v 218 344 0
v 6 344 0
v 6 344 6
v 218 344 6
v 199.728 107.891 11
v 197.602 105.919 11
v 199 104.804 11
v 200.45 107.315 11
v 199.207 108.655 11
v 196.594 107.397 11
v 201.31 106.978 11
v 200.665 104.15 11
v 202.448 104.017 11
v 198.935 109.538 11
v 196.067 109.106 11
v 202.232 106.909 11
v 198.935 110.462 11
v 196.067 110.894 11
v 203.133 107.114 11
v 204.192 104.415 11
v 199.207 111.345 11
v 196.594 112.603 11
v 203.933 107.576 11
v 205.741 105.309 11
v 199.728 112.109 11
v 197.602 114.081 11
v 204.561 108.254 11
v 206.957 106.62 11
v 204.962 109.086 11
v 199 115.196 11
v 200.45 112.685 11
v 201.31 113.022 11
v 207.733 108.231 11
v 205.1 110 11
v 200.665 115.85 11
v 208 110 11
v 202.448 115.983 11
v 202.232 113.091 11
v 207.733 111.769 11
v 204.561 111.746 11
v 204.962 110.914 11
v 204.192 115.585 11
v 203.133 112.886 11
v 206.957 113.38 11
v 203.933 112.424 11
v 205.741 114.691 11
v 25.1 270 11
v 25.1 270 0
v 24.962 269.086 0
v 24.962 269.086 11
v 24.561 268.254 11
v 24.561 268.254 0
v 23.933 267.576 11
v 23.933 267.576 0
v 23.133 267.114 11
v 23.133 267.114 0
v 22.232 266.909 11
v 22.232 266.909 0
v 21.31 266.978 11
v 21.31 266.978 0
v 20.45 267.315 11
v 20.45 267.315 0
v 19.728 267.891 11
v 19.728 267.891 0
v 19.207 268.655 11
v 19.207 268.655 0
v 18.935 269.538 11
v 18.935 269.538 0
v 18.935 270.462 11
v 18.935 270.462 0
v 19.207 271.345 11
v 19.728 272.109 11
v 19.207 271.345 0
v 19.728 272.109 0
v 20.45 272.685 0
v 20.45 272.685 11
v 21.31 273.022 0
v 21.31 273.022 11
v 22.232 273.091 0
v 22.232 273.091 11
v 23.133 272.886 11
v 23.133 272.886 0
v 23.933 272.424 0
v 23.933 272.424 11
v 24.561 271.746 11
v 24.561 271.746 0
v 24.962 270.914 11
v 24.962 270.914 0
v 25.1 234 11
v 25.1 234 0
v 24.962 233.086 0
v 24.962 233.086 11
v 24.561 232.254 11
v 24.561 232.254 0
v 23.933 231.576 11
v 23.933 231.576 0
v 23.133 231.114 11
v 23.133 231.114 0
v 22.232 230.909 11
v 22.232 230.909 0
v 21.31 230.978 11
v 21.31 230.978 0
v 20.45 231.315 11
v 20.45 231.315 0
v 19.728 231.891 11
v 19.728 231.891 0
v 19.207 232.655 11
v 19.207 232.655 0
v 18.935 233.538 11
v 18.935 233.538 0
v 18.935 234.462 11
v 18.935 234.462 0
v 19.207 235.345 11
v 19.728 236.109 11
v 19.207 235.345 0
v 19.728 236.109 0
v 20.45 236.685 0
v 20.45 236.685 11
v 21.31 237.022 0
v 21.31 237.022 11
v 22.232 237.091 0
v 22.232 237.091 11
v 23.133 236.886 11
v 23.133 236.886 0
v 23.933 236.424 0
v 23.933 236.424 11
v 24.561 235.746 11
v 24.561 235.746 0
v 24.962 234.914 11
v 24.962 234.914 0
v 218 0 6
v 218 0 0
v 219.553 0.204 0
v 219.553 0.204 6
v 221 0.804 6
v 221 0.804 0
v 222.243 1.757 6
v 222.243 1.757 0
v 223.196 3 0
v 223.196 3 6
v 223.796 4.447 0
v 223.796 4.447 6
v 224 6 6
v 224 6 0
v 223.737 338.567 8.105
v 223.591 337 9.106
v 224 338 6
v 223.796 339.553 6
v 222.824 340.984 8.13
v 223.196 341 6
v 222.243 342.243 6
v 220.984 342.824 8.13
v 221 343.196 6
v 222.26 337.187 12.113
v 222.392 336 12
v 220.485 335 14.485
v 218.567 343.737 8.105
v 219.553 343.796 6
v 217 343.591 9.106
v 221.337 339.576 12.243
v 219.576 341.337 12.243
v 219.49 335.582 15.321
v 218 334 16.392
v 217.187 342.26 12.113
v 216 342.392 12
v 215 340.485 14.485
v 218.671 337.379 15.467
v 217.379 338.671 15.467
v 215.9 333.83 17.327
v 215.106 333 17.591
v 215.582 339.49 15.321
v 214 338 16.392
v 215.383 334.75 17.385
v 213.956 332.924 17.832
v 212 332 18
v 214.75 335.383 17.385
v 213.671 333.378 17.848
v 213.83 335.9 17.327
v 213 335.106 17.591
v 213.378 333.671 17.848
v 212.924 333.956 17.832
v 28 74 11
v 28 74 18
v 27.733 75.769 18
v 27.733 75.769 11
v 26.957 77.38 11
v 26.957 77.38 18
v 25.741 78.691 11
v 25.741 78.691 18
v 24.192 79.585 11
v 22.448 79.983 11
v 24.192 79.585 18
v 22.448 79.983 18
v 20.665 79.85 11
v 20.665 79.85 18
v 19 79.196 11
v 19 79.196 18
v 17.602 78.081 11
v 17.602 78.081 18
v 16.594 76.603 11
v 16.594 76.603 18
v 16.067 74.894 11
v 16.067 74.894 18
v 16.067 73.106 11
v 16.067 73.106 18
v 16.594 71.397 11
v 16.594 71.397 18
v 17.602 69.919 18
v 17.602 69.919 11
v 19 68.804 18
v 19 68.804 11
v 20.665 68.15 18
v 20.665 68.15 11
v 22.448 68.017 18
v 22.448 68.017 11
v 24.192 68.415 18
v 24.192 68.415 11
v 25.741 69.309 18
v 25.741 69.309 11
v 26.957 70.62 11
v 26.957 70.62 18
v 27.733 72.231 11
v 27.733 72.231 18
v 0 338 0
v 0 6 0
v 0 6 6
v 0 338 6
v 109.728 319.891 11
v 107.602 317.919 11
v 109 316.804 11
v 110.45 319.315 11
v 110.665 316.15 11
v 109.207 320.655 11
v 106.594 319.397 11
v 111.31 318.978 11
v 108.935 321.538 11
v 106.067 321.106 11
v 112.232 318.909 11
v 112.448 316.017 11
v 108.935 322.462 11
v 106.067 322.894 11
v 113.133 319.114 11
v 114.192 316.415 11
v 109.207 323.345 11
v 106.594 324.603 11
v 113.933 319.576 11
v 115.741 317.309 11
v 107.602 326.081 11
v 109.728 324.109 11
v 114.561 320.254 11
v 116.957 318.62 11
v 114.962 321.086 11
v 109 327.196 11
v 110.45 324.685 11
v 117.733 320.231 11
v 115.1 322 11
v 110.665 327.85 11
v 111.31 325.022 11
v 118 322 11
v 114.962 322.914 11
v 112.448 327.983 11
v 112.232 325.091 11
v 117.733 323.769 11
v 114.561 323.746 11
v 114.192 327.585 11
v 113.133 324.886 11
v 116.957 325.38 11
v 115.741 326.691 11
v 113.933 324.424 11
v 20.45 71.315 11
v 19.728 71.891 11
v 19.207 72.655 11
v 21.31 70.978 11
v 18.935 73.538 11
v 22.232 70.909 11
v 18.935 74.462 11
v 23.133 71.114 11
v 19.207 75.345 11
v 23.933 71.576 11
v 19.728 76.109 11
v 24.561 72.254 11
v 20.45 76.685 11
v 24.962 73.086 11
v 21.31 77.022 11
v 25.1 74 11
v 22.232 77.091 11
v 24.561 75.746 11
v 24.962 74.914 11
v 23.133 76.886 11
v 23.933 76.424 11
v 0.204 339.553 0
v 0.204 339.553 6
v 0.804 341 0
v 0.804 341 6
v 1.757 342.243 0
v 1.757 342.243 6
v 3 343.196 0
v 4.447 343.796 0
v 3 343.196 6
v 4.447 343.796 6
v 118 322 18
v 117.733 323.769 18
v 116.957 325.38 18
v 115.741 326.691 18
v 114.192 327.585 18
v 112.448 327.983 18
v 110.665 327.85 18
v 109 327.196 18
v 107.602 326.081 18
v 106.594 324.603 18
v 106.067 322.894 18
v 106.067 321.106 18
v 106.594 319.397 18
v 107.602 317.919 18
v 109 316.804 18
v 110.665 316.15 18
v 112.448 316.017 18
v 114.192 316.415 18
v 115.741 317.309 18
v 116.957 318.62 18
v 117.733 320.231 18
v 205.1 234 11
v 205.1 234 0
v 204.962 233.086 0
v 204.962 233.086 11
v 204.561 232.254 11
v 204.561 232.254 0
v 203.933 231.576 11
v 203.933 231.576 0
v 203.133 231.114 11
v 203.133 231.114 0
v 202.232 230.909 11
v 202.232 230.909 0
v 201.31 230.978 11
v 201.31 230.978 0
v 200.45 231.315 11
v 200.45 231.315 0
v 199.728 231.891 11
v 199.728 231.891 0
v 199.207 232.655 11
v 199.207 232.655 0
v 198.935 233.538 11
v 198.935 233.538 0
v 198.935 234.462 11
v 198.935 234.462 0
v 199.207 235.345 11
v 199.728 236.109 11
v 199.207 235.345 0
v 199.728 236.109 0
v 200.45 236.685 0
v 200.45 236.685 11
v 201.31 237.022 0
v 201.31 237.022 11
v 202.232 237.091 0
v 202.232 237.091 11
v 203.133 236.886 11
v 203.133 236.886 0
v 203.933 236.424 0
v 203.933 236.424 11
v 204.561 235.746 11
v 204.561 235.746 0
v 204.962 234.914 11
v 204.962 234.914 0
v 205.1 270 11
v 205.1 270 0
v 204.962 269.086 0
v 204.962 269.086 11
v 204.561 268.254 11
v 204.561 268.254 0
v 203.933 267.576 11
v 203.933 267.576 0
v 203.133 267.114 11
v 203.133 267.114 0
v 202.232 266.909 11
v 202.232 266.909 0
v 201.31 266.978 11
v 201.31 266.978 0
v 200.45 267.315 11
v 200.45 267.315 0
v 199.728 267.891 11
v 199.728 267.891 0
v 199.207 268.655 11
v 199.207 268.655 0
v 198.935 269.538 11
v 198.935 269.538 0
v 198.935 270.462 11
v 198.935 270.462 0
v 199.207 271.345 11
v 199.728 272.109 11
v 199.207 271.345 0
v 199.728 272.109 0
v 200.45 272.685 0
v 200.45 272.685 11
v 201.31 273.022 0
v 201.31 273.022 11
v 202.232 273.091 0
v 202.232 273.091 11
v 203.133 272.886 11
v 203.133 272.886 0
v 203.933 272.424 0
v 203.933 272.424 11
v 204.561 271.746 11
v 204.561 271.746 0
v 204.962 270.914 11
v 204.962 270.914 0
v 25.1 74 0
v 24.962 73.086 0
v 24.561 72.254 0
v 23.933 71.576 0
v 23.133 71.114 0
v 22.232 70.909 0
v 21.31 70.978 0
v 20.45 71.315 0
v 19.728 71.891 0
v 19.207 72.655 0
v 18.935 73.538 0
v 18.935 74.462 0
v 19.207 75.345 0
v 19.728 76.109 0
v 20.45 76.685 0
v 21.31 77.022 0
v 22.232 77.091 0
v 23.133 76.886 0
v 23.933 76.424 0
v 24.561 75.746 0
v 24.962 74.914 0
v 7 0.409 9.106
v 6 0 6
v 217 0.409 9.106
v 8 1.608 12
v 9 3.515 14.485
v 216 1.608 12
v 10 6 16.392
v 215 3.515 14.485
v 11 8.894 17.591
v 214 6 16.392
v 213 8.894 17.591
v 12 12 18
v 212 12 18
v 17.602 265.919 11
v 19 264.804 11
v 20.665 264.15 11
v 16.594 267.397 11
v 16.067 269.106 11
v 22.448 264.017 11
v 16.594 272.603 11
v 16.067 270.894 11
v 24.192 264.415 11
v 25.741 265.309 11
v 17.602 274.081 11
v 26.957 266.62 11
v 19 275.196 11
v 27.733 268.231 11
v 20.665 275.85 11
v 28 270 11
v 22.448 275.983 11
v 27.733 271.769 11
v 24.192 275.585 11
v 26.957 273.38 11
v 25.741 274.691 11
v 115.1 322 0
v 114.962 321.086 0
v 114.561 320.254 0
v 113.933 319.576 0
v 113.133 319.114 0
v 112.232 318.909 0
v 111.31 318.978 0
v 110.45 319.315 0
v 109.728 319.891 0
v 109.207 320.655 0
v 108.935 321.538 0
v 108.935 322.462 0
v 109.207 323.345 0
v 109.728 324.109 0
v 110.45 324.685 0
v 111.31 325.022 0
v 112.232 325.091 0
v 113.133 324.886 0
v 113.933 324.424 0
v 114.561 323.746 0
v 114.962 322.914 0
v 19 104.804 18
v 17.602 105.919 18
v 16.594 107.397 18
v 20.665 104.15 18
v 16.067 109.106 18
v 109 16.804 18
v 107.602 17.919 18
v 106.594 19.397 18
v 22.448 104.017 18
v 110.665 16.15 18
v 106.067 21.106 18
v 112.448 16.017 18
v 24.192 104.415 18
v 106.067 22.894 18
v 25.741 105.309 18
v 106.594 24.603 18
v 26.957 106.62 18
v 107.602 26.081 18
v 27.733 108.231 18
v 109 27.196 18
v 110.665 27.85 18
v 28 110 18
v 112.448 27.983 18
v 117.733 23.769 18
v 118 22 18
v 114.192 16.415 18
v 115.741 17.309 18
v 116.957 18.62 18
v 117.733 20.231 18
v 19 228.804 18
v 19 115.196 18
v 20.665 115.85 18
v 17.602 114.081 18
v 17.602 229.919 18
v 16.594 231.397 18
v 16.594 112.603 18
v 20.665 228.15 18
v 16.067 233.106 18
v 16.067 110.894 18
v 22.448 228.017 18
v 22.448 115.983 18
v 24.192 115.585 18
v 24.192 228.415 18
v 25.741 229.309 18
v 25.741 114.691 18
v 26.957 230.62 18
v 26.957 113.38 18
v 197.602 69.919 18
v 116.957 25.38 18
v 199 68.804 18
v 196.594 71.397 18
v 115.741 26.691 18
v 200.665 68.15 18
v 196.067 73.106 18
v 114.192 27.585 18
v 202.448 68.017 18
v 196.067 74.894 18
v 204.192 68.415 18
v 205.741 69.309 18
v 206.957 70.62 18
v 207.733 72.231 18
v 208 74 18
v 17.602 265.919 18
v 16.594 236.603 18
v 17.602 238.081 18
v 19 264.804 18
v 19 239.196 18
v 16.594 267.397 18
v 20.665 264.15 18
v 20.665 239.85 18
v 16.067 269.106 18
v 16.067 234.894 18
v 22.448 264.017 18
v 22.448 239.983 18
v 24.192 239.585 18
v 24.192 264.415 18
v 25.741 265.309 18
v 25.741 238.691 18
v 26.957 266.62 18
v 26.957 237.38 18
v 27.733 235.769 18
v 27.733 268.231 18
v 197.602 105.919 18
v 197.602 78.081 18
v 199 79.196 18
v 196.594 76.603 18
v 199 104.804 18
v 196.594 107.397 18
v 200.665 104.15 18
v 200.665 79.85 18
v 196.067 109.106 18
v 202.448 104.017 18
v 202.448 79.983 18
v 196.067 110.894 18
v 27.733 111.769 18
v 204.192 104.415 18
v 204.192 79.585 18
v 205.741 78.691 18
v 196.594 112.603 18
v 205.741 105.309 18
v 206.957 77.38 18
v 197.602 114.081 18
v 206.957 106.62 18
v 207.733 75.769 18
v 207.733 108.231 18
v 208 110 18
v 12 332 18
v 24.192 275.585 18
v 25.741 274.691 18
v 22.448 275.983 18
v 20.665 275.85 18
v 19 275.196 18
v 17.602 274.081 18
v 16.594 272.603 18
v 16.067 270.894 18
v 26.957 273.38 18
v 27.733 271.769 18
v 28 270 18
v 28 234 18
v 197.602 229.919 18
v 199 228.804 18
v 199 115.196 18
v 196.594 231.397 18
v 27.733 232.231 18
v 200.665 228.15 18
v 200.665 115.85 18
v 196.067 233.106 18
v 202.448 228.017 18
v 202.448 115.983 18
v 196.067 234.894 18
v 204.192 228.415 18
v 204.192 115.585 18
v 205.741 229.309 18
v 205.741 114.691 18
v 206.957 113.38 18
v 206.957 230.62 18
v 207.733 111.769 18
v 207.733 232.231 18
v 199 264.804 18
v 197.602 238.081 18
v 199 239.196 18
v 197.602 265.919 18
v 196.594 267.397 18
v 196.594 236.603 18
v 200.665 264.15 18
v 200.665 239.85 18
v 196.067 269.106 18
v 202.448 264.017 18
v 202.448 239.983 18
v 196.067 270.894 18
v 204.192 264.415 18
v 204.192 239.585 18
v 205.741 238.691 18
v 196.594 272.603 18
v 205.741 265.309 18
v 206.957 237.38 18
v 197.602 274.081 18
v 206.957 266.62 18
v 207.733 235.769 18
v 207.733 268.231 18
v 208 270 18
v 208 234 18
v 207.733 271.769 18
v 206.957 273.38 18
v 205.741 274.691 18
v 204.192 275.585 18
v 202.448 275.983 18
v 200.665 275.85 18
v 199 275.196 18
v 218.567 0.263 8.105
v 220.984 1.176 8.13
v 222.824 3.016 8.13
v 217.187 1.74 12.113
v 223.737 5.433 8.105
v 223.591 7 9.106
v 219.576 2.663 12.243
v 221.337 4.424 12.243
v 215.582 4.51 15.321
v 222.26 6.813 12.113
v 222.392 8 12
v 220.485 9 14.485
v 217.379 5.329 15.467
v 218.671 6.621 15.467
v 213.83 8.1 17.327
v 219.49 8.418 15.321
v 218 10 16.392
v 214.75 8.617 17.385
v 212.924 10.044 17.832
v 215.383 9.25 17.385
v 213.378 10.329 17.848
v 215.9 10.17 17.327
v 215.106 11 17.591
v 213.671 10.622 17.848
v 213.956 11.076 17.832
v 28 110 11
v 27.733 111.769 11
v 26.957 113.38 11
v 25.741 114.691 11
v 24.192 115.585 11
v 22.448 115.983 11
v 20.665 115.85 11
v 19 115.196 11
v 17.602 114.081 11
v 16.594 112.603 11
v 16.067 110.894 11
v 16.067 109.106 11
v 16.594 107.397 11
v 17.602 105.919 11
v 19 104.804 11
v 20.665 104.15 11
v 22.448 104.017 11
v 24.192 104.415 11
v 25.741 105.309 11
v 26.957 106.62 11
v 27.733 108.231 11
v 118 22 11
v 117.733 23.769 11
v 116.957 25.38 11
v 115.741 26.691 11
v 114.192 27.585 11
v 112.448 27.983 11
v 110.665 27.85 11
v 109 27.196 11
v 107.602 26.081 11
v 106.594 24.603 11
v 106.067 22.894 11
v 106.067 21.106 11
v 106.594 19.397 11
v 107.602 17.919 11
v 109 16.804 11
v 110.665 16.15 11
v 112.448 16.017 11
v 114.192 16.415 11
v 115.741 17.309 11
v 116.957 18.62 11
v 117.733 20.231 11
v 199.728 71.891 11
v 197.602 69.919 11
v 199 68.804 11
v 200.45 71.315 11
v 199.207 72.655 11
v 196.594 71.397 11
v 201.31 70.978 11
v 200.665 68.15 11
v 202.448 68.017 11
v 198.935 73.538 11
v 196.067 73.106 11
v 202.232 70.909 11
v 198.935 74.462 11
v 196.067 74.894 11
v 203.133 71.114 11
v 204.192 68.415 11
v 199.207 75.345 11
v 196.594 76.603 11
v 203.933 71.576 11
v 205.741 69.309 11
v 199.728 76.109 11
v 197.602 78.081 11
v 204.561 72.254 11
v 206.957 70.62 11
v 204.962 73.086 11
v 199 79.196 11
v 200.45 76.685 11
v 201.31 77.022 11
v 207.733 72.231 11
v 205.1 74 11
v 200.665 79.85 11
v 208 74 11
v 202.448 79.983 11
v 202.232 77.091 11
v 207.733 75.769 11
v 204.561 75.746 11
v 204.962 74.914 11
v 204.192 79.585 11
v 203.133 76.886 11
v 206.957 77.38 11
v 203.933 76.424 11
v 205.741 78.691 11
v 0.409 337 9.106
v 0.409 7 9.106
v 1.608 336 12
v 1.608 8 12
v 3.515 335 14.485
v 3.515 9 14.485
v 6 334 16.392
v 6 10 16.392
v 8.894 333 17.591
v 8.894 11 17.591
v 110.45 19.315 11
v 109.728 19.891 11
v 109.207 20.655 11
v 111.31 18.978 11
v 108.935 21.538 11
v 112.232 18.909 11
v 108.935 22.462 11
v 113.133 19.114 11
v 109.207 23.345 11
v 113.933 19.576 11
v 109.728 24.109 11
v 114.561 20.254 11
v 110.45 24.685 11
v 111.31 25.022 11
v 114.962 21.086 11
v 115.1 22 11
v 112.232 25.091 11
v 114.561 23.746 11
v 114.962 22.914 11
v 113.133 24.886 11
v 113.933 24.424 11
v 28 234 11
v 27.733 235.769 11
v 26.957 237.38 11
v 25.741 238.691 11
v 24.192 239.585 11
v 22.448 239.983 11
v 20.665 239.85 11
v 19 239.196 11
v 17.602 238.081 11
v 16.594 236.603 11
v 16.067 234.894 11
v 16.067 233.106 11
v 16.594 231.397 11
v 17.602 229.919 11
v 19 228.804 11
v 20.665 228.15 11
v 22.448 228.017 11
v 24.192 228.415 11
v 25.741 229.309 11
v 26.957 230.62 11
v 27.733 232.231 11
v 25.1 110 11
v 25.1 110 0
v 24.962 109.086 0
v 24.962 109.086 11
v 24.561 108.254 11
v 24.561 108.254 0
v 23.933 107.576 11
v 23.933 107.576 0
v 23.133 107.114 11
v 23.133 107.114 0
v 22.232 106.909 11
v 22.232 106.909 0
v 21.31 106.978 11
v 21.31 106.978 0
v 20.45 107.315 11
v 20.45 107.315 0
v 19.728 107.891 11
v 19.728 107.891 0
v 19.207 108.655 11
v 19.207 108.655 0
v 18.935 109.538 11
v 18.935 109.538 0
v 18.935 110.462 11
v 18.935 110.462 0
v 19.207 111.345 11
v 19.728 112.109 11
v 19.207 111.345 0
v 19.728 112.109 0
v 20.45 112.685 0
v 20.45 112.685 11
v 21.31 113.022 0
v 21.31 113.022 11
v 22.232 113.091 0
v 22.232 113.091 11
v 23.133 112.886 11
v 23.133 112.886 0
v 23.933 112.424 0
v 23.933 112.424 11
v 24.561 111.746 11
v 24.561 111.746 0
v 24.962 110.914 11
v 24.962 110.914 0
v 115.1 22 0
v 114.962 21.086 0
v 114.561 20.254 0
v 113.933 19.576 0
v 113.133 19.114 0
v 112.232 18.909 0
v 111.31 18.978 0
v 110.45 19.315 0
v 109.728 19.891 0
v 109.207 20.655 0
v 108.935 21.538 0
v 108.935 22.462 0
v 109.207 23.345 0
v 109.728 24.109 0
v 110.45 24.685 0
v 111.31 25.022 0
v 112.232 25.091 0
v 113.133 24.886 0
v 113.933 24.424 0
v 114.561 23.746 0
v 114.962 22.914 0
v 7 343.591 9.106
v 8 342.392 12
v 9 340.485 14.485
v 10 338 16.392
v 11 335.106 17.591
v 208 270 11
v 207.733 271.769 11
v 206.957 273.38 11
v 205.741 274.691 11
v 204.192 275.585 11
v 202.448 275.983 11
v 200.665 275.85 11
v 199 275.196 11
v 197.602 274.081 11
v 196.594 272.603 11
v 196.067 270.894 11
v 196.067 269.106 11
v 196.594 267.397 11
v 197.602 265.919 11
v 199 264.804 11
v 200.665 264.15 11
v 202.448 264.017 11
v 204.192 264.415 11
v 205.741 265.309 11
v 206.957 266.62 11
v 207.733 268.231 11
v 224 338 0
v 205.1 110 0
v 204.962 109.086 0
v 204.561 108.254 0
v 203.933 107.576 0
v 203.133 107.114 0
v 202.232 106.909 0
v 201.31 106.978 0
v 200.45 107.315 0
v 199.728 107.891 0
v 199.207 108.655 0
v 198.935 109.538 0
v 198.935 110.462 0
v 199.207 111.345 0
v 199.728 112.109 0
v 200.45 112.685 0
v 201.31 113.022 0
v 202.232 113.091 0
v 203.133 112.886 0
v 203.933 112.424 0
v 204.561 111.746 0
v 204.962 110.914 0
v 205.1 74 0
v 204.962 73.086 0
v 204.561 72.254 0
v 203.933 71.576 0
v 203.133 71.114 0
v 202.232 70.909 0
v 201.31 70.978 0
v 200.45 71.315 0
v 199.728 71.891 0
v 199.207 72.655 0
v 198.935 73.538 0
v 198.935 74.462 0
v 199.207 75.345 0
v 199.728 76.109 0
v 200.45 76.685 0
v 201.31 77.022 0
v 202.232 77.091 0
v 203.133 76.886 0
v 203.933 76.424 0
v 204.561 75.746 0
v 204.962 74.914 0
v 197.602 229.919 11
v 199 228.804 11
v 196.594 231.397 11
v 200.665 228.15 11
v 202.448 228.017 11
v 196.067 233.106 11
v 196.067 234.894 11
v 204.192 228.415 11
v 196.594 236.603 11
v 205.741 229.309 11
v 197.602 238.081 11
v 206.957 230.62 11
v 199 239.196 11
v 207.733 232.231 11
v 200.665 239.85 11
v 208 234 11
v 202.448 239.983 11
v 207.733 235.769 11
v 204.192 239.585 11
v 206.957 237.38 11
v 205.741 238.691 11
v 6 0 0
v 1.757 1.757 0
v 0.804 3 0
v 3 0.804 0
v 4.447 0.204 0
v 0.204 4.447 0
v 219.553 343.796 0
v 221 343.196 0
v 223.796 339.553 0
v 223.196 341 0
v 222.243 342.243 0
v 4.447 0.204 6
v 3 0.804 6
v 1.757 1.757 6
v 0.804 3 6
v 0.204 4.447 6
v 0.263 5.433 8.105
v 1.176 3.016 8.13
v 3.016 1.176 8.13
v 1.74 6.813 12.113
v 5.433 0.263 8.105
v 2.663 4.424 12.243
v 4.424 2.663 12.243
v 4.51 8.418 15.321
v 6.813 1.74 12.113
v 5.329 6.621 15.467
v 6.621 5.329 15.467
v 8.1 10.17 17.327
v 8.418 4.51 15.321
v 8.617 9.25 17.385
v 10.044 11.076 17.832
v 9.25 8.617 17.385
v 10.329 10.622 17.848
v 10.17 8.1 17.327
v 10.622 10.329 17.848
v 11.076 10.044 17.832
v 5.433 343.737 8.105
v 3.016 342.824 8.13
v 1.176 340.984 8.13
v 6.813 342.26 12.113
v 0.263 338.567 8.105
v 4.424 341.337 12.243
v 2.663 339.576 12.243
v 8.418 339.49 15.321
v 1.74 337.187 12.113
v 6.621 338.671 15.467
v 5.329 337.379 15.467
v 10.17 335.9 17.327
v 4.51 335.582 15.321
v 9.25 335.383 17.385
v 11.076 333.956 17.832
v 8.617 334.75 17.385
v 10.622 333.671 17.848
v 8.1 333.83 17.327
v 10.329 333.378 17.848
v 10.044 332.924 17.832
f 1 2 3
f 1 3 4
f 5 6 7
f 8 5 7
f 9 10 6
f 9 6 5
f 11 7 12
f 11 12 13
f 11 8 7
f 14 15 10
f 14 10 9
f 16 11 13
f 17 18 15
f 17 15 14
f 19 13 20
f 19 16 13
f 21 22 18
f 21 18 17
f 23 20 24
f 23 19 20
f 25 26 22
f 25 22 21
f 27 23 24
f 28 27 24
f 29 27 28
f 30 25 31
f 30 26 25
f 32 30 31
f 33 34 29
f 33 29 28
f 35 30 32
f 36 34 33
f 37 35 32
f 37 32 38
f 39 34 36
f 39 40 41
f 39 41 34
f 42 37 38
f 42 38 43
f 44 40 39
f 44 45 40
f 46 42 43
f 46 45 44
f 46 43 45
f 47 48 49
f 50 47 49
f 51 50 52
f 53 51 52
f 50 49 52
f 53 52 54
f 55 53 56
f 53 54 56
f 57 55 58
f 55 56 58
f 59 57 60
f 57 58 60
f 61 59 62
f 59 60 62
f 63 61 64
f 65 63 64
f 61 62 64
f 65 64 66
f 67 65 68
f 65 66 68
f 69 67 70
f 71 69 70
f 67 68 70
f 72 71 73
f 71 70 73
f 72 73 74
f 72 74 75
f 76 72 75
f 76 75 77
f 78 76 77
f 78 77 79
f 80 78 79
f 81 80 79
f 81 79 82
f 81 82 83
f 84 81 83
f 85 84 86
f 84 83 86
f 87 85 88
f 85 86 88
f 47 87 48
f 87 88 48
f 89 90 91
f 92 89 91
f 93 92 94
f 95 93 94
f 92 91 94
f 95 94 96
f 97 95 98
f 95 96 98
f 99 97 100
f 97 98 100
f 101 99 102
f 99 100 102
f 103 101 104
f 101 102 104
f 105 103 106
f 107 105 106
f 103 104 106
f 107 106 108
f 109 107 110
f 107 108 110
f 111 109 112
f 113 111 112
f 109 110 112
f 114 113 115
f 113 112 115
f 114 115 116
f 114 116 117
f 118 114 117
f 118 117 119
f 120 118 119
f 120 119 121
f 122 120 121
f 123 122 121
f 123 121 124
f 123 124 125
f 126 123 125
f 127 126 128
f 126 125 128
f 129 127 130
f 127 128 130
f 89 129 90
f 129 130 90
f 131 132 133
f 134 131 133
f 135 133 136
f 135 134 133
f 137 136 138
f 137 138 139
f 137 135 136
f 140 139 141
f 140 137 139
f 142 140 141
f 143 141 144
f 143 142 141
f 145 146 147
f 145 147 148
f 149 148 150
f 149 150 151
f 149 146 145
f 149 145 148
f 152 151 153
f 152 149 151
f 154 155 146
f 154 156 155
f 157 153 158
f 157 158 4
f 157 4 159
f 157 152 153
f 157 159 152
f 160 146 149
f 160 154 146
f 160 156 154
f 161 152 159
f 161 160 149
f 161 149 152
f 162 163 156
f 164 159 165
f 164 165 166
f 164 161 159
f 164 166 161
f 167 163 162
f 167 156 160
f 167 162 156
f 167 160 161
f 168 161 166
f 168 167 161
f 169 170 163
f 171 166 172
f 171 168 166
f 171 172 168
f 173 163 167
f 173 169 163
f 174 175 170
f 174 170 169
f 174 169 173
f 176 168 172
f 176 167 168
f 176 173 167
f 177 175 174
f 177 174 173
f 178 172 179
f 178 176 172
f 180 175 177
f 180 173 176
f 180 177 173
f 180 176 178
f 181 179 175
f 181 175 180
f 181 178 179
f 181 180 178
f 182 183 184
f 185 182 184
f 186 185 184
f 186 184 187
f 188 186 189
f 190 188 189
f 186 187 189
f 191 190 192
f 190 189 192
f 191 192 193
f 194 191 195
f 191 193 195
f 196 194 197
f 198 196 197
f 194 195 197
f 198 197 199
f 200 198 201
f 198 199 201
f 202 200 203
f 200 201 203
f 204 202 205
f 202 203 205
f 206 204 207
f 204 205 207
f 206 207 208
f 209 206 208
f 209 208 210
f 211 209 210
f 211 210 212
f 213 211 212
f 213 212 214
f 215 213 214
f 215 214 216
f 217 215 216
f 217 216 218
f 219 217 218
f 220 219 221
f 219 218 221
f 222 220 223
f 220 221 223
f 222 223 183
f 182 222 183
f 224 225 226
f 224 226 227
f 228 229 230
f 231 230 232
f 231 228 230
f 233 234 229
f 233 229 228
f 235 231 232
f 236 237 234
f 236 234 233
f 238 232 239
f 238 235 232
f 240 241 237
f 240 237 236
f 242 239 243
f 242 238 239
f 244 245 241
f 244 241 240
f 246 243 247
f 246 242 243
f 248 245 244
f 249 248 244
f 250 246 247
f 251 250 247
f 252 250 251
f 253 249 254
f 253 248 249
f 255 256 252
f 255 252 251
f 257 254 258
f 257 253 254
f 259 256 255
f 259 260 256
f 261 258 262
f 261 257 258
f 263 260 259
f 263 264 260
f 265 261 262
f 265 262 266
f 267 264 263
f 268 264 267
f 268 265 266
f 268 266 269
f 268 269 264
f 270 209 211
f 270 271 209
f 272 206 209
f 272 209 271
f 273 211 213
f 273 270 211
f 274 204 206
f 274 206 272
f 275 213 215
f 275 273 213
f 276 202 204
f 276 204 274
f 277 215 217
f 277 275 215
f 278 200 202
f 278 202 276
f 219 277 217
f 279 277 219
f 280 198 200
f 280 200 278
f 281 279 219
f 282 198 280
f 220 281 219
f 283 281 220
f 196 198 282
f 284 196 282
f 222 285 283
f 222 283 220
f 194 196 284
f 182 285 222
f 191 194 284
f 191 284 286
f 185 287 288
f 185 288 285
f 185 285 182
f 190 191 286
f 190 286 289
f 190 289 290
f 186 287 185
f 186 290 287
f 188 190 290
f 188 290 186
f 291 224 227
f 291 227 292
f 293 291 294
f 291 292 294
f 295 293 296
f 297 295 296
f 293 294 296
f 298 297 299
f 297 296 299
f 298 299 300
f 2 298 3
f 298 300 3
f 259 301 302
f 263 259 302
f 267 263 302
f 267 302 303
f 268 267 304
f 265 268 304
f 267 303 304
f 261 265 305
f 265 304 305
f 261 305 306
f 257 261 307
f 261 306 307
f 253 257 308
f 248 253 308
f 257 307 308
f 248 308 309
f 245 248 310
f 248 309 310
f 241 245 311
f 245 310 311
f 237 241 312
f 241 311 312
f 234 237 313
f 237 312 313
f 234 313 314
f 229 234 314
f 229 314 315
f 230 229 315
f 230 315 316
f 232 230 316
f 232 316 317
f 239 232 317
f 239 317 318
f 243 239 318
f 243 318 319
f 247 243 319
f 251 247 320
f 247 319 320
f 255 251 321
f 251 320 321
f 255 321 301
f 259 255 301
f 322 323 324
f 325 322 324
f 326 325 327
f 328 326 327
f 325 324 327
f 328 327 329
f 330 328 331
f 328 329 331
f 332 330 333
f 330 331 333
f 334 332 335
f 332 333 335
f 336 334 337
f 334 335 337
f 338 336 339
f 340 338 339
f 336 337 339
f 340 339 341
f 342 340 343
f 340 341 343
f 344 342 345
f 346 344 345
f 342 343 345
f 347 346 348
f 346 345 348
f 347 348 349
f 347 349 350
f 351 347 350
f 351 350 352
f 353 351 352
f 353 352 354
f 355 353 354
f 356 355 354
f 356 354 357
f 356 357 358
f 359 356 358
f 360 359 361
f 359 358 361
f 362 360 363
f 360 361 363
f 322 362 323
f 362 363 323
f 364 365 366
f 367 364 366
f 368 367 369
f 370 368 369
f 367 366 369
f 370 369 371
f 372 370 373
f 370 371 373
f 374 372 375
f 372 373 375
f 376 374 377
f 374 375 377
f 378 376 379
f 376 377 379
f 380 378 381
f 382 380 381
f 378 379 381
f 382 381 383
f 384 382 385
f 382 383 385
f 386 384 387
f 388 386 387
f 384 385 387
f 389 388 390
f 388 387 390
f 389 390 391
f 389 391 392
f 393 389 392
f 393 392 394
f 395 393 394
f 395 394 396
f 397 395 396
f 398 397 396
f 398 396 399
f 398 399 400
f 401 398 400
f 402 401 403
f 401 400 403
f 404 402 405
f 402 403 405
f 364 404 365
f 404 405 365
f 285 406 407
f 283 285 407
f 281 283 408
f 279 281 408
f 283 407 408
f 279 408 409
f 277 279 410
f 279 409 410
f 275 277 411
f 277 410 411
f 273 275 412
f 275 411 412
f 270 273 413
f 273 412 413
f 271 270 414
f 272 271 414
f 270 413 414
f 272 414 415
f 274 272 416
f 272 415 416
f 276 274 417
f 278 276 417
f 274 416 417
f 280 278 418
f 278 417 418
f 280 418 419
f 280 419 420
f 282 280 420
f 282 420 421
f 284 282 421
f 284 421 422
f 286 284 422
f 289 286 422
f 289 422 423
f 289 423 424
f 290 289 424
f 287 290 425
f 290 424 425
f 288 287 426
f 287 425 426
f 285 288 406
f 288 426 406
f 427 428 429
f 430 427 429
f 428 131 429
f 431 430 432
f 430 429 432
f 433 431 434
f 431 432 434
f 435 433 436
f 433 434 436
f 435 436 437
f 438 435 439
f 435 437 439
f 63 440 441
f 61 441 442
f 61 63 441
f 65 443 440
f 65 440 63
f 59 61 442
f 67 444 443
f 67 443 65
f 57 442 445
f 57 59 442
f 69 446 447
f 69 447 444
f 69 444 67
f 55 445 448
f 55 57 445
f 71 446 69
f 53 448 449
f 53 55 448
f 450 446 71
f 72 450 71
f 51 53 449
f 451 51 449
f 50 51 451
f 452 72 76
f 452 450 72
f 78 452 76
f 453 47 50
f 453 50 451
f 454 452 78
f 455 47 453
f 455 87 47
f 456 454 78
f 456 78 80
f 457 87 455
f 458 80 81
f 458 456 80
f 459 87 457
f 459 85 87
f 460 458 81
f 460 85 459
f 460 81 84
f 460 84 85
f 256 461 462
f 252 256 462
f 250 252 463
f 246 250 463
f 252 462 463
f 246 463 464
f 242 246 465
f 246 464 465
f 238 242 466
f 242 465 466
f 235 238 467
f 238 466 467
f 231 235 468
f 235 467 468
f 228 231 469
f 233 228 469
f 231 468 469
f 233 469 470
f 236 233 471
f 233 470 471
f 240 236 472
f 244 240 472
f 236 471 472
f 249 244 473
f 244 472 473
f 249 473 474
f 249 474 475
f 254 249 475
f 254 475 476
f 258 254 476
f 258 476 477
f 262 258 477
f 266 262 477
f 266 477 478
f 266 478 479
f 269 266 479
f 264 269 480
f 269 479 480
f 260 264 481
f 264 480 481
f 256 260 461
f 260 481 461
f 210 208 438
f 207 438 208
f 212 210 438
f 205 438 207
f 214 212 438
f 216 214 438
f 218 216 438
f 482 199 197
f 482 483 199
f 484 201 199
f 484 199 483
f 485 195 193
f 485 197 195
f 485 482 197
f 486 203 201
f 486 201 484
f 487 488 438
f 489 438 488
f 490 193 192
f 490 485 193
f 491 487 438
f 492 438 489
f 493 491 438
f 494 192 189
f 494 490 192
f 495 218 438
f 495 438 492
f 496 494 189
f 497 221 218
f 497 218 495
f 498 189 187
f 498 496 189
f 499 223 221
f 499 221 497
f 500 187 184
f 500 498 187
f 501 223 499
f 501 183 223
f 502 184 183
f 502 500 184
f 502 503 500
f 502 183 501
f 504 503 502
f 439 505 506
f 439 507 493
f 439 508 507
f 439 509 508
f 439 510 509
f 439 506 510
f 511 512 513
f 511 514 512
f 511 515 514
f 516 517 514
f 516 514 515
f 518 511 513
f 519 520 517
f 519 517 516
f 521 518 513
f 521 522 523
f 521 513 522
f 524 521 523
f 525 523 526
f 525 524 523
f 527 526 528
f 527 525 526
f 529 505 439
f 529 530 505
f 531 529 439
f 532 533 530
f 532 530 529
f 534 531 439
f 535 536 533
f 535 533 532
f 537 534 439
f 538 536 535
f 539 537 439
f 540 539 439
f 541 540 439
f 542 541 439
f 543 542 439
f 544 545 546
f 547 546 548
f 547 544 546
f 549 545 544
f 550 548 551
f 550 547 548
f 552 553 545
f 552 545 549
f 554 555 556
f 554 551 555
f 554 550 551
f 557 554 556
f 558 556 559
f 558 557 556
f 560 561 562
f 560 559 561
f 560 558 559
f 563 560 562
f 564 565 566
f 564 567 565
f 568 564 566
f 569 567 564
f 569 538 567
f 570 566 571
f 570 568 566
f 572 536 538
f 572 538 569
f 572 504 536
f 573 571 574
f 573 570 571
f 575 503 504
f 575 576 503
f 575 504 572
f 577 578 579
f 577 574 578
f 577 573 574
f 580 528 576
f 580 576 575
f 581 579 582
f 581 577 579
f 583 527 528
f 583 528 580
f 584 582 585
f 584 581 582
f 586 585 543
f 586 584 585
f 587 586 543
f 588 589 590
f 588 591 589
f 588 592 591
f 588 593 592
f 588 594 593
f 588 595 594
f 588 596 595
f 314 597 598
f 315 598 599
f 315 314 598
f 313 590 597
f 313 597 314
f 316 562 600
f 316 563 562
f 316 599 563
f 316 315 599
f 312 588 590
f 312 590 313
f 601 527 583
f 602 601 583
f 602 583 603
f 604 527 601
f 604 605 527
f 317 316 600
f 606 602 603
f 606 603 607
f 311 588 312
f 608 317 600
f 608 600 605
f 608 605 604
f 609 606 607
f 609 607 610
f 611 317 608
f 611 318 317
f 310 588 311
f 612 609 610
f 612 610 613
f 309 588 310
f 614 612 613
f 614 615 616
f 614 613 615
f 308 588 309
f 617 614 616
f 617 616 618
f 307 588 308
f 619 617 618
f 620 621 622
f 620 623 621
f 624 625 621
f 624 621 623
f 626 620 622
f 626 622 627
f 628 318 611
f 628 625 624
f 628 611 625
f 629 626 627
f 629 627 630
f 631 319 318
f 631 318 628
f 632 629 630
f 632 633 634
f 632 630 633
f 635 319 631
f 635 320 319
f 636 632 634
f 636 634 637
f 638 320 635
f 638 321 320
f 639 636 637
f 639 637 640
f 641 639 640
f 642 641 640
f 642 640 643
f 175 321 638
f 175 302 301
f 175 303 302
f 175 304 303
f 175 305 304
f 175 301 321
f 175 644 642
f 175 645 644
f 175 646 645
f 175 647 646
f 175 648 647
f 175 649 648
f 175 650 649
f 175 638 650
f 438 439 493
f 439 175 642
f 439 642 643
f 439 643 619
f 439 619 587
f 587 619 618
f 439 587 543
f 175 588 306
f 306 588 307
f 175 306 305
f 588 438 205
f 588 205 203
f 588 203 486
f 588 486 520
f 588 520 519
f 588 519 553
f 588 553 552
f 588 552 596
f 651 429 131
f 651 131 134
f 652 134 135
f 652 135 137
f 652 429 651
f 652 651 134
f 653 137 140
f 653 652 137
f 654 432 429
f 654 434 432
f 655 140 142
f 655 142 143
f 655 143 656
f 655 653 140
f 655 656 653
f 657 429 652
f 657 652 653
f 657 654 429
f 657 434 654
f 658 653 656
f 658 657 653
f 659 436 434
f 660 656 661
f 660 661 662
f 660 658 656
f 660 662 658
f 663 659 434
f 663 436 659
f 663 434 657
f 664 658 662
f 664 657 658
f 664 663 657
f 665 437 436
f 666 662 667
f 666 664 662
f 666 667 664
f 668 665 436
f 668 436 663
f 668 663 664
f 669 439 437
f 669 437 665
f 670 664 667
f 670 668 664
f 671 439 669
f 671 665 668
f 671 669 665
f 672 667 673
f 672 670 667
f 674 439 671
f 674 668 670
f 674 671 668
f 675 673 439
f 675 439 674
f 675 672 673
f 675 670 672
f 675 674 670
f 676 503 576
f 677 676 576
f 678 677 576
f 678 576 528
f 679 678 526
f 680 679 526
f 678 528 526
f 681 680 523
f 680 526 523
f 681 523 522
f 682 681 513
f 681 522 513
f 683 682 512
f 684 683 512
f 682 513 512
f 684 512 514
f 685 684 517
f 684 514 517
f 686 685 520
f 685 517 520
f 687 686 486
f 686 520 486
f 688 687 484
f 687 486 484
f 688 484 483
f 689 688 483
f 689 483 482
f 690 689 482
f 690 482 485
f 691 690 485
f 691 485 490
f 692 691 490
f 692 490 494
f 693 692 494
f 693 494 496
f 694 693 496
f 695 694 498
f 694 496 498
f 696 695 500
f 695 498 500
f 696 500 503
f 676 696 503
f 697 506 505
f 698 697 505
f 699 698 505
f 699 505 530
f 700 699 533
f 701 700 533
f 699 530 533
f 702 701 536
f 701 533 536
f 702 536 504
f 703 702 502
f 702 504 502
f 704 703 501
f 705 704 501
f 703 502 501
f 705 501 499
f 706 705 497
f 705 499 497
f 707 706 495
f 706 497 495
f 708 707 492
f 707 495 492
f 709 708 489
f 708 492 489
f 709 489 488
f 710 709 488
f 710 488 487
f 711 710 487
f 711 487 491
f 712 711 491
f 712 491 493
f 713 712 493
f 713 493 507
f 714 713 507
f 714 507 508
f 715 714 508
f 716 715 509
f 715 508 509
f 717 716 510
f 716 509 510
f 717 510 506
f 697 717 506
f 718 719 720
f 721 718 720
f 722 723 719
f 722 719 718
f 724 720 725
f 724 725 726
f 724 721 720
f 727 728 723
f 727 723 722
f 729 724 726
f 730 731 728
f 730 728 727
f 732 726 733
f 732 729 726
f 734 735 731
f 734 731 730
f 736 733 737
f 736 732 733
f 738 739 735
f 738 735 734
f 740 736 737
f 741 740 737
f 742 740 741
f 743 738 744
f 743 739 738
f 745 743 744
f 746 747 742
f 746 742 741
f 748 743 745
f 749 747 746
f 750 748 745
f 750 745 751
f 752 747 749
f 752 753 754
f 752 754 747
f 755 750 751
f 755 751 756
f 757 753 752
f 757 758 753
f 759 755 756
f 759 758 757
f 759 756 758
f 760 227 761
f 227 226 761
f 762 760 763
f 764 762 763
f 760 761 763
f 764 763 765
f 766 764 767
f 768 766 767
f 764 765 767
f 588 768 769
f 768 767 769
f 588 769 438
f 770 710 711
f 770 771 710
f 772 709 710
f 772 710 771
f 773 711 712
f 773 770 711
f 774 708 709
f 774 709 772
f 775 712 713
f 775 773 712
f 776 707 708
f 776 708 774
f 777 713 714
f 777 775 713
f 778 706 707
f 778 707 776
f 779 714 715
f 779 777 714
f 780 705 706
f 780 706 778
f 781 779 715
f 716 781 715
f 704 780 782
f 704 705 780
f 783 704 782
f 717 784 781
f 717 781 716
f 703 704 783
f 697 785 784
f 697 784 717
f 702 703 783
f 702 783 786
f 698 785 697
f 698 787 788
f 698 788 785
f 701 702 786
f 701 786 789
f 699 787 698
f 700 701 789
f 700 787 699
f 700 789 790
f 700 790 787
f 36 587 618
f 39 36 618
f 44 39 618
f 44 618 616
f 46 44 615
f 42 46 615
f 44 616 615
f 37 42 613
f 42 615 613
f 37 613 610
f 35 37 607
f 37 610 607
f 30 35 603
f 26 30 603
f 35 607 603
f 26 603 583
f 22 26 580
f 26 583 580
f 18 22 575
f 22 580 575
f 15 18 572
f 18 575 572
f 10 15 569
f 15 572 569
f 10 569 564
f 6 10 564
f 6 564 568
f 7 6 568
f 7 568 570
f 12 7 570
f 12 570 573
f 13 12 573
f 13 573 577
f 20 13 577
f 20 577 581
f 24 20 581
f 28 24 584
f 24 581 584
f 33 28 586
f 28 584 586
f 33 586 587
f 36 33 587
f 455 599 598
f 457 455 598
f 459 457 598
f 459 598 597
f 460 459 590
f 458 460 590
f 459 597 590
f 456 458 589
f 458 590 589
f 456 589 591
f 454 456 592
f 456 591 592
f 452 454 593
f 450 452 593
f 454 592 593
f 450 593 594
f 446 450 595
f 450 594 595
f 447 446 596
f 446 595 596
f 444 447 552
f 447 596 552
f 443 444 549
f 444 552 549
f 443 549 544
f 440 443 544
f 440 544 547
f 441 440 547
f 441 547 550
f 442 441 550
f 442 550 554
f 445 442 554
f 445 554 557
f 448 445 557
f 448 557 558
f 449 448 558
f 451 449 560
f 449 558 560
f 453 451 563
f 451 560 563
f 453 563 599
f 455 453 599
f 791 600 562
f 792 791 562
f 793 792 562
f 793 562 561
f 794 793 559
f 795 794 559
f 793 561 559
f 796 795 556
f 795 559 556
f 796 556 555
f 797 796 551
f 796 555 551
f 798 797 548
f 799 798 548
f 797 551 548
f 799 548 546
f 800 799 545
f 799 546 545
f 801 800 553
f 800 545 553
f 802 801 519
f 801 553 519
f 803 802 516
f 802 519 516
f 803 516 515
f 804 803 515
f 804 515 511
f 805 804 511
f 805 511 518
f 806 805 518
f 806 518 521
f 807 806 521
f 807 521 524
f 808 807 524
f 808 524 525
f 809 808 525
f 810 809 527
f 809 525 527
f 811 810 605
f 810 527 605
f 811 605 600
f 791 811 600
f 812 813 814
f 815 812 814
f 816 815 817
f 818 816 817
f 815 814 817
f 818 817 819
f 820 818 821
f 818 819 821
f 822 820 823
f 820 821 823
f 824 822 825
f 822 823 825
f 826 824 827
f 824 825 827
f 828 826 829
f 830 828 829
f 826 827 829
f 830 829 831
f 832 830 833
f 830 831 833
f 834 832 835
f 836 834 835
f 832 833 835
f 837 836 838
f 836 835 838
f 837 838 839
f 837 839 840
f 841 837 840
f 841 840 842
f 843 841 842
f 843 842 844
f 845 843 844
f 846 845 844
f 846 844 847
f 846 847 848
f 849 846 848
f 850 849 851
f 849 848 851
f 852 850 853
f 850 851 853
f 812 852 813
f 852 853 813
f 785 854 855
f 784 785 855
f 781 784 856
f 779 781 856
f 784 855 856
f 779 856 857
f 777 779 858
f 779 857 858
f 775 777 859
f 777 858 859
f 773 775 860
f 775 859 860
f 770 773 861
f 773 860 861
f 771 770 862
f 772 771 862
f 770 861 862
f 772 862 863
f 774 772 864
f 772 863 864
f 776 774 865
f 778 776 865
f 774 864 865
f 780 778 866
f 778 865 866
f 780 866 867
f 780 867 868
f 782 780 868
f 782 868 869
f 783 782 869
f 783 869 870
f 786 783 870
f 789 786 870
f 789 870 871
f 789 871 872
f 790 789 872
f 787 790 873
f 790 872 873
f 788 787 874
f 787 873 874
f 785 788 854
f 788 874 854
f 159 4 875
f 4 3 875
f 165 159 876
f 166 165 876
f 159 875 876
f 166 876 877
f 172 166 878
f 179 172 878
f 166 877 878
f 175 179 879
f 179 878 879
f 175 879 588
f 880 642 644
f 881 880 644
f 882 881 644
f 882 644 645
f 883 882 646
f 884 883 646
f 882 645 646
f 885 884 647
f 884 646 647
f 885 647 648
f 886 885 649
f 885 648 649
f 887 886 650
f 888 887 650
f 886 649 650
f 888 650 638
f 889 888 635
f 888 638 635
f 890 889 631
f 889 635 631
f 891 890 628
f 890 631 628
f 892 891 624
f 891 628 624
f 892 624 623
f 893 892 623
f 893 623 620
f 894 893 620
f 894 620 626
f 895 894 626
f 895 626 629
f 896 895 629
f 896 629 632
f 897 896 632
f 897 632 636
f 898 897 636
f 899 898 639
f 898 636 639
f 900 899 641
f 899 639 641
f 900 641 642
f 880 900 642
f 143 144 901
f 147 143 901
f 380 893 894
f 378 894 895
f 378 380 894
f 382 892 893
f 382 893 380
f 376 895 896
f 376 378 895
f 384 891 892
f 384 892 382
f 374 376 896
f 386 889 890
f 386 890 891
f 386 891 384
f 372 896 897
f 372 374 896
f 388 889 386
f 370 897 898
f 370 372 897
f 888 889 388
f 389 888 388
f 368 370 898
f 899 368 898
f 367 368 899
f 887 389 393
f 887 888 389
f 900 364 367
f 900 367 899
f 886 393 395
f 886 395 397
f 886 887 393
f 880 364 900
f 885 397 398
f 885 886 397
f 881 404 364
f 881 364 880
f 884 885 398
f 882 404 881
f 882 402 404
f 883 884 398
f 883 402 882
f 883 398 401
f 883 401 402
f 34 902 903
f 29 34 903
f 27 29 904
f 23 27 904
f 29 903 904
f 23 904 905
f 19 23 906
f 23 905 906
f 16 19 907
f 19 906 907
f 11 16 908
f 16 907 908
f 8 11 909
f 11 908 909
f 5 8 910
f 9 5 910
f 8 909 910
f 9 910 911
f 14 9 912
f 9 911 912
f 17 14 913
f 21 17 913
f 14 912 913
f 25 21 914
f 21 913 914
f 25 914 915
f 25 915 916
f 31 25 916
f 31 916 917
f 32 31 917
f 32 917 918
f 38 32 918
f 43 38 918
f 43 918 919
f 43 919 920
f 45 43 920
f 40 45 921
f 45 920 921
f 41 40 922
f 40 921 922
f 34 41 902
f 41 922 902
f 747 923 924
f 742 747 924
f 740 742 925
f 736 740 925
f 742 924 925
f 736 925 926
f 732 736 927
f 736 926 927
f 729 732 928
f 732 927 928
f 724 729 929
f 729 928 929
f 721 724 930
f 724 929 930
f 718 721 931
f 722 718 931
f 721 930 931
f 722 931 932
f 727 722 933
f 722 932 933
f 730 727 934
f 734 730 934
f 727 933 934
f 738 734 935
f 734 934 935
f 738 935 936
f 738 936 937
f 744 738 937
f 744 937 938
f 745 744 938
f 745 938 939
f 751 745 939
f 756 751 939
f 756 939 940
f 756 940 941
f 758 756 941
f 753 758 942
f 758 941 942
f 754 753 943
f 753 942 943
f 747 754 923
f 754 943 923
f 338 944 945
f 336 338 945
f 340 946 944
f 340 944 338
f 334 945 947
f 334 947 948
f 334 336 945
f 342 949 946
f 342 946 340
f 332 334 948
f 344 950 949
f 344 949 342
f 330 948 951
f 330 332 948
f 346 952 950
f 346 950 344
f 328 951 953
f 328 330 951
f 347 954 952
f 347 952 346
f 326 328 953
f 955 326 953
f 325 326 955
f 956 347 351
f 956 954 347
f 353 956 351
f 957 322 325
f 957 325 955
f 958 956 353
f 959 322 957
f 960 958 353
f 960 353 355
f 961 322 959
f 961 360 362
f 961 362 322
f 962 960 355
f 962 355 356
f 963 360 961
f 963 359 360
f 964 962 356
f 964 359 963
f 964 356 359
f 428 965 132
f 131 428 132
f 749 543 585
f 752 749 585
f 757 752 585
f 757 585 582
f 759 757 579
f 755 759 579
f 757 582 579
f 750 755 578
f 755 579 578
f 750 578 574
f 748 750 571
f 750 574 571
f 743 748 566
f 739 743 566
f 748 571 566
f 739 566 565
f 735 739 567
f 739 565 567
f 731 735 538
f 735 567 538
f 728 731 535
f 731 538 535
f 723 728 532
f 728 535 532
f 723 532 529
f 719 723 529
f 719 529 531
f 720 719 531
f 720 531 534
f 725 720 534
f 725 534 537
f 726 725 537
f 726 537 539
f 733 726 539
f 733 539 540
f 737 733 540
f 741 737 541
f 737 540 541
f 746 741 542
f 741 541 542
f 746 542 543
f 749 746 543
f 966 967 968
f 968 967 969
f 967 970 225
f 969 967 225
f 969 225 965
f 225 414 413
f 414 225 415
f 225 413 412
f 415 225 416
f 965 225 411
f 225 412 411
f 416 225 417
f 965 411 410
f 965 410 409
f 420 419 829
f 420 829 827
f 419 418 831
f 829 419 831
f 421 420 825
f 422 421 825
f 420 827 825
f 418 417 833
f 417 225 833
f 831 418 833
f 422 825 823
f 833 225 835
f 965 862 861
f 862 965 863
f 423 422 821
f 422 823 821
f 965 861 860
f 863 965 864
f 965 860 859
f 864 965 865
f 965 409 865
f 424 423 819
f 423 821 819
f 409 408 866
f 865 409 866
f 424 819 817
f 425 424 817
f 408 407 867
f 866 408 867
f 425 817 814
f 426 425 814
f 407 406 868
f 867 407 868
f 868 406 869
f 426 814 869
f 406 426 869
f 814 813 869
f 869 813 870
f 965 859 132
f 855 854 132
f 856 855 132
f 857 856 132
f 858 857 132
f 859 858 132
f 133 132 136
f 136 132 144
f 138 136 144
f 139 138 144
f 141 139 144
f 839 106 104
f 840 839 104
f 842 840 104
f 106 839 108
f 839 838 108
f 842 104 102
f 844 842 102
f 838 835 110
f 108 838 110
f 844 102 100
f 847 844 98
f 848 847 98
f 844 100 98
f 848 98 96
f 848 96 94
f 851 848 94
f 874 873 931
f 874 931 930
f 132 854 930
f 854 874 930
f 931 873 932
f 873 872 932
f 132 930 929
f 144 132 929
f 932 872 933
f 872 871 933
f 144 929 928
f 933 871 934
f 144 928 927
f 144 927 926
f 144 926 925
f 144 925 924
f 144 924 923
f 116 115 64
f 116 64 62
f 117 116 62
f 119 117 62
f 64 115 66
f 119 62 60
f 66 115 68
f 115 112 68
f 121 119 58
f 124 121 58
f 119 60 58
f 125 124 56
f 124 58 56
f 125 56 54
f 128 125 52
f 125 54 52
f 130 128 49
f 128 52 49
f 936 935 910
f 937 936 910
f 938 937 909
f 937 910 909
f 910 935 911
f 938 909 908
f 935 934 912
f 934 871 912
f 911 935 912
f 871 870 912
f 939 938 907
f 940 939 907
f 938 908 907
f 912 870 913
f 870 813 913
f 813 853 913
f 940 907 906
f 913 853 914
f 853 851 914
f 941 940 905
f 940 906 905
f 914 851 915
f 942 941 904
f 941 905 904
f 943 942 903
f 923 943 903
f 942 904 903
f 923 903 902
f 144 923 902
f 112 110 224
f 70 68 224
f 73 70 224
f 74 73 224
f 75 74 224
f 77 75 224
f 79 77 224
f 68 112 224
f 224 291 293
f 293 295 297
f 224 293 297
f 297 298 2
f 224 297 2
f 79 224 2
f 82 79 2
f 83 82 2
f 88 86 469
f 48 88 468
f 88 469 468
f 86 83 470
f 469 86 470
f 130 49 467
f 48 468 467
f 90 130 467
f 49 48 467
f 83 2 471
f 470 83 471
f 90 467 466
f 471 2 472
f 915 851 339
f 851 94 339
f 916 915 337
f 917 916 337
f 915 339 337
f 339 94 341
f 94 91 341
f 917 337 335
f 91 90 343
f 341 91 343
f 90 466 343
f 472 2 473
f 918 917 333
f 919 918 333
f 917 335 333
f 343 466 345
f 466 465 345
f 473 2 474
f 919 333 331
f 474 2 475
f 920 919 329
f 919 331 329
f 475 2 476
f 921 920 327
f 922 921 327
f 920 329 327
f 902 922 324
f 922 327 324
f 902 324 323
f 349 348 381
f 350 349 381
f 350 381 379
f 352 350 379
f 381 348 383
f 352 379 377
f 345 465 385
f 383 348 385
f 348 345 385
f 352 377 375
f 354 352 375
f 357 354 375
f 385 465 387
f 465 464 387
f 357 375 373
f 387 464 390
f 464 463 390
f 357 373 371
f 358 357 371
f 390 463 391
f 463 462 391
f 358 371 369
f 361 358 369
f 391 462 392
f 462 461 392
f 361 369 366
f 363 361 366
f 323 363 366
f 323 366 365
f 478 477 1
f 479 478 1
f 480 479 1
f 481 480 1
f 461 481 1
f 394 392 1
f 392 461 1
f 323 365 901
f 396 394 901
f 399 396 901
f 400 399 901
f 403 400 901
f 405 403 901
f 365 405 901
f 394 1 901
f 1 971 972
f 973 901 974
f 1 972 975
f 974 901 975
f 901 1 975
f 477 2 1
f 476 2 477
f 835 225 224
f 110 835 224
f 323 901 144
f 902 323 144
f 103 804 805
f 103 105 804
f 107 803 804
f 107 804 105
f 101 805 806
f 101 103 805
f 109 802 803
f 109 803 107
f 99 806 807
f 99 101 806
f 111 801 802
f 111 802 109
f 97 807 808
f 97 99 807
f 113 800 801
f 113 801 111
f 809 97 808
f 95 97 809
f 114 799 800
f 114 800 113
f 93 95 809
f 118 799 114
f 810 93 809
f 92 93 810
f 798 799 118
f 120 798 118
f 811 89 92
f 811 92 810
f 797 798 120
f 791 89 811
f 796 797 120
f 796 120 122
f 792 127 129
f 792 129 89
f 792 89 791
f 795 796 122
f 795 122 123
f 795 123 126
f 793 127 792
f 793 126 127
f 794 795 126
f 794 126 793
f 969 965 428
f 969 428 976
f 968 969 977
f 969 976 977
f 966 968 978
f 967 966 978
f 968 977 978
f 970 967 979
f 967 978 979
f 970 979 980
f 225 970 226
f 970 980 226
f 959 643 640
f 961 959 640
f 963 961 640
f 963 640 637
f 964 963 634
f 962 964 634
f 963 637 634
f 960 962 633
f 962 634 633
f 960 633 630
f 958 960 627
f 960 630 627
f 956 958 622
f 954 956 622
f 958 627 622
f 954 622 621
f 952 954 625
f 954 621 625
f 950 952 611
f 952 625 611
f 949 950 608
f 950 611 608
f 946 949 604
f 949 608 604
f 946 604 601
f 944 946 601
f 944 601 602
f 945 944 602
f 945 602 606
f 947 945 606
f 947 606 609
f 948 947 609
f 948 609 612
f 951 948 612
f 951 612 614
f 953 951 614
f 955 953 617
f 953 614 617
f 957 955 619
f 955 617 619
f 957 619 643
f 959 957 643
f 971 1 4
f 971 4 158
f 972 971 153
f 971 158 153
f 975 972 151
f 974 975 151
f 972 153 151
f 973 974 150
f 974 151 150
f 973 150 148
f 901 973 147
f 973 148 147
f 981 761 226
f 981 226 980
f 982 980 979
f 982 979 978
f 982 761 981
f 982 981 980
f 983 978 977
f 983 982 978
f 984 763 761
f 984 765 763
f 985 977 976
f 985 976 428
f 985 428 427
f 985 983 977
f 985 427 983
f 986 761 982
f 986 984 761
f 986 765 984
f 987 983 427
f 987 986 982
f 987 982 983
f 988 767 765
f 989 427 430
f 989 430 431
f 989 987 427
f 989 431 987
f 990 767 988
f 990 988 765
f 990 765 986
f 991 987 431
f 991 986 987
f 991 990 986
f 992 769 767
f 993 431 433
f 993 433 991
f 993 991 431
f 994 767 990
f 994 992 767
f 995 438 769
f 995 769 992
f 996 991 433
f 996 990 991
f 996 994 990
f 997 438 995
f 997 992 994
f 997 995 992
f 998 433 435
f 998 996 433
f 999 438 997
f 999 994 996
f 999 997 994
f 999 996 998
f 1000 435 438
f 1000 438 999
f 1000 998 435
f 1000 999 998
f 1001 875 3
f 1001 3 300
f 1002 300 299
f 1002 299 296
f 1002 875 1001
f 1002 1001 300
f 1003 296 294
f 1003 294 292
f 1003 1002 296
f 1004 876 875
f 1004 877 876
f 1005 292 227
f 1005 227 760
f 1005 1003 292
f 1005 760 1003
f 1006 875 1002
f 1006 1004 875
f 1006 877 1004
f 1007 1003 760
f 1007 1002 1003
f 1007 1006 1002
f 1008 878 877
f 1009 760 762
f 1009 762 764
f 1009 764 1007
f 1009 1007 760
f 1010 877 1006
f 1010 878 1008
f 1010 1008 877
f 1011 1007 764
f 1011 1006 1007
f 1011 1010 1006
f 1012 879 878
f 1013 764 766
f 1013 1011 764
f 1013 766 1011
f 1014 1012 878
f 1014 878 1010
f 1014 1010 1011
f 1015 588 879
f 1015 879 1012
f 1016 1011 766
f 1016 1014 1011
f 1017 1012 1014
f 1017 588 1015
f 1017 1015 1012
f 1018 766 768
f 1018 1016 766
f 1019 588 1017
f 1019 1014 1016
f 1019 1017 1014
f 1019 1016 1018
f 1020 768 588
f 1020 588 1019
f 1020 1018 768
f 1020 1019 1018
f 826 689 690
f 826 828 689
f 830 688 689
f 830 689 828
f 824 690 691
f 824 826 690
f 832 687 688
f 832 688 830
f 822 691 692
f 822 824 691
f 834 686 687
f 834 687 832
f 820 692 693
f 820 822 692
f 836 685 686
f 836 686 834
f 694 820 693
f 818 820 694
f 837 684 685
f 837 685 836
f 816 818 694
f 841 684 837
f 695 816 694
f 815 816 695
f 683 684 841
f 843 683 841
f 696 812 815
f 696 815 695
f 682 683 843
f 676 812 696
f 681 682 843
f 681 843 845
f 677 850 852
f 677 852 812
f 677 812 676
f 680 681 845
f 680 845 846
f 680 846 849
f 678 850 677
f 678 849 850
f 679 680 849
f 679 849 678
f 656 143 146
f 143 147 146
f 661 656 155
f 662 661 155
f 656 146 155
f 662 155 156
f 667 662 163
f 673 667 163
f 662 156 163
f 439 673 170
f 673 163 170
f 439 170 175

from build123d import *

# Parameters (mm, degrees)
SKETCH_W        = 224
SKETCH_H        = 344
PAD_DEPTH       = 18
SKETCH001_R     = 6
POCKET_DEPTH    = 7
SKETCH002_R     = 3.1
POCKET001_DEPTH = 11
FILLET_R        = 6
FILLET001_R     = 6
FILLET002_R     = 6
FILLET003_R     = 6
FILLET004_R     = 12


with BuildPart() as part:
    # Sketch → Pad (new body)
    with BuildSketch(Plane.XY):
        with Locations((112, 172)):
            Rectangle(SKETCH_W, SKETCH_H)
    extrude(amount=PAD_DEPTH)

    # Sketch001 (on Face6 of Pad) → Pocket (cut)
    with BuildSketch(Plane.XY.offset(18)):
        with Locations((112, 322)):
            Circle(SKETCH001_R)
        with Locations((22, 270)):
            Circle(SKETCH001_R)
        with Locations((22, 74)):
            Circle(SKETCH001_R)
        with Locations((202, 234)):
            Circle(SKETCH001_R)
        with Locations((202, 110)):
            Circle(SKETCH001_R)
        with Locations((112, 22)):
            Circle(SKETCH001_R)
        with Locations((22, 234)):
            Circle(SKETCH001_R)
        with Locations((22, 110)):
            Circle(SKETCH001_R)
        with Locations((202, 270)):
            Circle(SKETCH001_R)
        with Locations((202, 74)):
            Circle(SKETCH001_R)
    extrude(amount=-POCKET_DEPTH, mode=Mode.SUBTRACT)

    # Sketch002 (on Face4 of Pocket) → Pocket001 (cut)
    with BuildSketch(Plane(origin=(0, 0, 0), x_dir=(1, 0, 0), z_dir=(0, 0, -1))):
        with Locations((112, -22)):
            Circle(SKETCH002_R)
        with Locations((22, -74)):
            Circle(SKETCH002_R)
        with Locations((22, -110)):
            Circle(SKETCH002_R)
        with Locations((22, -234)):
            Circle(SKETCH002_R)
        with Locations((22, -270)):
            Circle(SKETCH002_R)
        with Locations((202, -74)):
            Circle(SKETCH002_R)
        with Locations((202, -110)):
            Circle(SKETCH002_R)
        with Locations((202, -234)):
            Circle(SKETCH002_R)
        with Locations((202, -270)):
            Circle(SKETCH002_R)
        with Locations((112, -322)):
            Circle(SKETCH002_R)
    extrude(amount=-POCKET001_DEPTH, mode=Mode.SUBTRACT)

    # Fillet
    fillet_edges = [part.edges().sort_by_distance(p)[0] for p in [
        (224, 0, 9),
    ]]
    fillet(fillet_edges, radius=FILLET_R)

    # Fillet001
    fillet001_edges = [part.edges().sort_by_distance(p)[0] for p in [
        (0, 0, 9),
    ]]
    fillet(fillet001_edges, radius=FILLET001_R)

    # Fillet002
    fillet002_edges = [part.edges().sort_by_distance(p)[0] for p in [
        (0, 344, 9),
    ]]
    fillet(fillet002_edges, radius=FILLET002_R)

    # Fillet003
    fillet003_edges = [part.edges().sort_by_distance(p)[0] for p in [
        (224, 344, 9),
    ]]
    fillet(fillet003_edges, radius=FILLET003_R)

    # Fillet004
    fillet004_edges = [part.edges().sort_by_distance(p)[0] for p in [
        (112, 0, 18),
        (222.242641, 1.757359, 18),
        (1.757359, 1.757359, 18),
        (0, 172, 18),
        (1.757359, 342.242641, 18),
        (112, 344, 18),
        (222.242641, 342.242641, 18),
        (224, 172, 18),
    ]]
    fillet(fillet004_edges, radius=FILLET004_R)


solid = part.part
